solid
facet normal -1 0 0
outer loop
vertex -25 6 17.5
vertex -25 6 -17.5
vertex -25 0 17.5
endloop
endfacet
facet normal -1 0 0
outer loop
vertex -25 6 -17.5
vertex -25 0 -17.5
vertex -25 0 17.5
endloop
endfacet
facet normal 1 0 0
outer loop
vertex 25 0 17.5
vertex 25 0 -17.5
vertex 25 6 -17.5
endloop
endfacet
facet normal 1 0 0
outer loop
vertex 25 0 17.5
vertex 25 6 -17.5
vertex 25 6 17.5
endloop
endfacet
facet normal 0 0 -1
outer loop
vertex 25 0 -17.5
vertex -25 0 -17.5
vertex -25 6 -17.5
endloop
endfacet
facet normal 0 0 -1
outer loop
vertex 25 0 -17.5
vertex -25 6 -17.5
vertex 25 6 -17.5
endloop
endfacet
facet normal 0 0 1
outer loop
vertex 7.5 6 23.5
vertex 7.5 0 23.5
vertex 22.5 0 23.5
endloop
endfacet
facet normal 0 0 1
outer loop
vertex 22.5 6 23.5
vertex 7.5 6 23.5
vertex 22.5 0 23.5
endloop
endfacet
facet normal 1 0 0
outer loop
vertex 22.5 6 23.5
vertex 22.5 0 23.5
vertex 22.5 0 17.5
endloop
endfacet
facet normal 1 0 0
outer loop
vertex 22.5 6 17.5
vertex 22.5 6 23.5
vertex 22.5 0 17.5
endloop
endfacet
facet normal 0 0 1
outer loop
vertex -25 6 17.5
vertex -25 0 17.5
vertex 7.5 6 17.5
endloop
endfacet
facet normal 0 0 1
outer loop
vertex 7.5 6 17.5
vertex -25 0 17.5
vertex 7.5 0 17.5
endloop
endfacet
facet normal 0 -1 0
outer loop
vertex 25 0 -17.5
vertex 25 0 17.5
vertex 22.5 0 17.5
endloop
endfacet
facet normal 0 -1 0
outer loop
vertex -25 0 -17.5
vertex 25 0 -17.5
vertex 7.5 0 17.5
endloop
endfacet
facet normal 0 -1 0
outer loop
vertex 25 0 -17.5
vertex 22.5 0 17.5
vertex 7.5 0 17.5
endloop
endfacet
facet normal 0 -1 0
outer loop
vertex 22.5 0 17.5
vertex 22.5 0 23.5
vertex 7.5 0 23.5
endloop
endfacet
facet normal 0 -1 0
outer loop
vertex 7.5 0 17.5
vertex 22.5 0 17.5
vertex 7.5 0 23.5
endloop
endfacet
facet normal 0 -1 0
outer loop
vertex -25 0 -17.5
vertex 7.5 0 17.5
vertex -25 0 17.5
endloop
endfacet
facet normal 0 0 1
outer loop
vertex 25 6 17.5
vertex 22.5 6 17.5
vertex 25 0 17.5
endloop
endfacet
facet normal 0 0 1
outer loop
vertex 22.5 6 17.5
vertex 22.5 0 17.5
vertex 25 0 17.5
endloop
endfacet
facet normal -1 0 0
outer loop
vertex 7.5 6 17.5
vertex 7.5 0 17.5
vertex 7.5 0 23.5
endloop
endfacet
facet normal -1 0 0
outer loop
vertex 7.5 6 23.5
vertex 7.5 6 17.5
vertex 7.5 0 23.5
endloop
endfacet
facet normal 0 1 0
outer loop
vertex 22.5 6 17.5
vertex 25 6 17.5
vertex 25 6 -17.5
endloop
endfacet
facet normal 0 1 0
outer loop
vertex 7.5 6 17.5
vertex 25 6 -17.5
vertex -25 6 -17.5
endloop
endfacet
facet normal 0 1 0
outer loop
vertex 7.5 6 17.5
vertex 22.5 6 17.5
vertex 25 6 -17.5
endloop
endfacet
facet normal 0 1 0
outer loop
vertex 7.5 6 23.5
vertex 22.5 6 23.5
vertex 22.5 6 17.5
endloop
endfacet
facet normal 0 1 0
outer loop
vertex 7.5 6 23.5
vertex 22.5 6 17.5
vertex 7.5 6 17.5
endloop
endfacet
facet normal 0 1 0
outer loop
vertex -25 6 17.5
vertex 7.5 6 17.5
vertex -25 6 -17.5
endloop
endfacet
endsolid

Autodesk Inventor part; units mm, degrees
ref_plane "YZ Plane" through (0, 0, 0) normal (1, 0, 0) x (0, 1, 0)
ref_plane "XZ Plane" through (0, 0, 0) normal (0, 1, 0) x (-1, 0, 0)
ref_plane "XY Plane" through (0, 0, 0) normal (0, 0, 1) x (1, 0, 0)
sketch "Sketch2" plane through (0, 0, 0) normal (0, 1, 0) x (-1, 0, 0)
  line L0 (25, -17.5) -> (-25, -17.5)
  line L1 (-25, -17.5) -> (-25, 17.5)
  line L2 (25, -17.5) -> (-25, 17.5) construction
  line L3 (-25, -17.5) -> (25, 17.5) construction
  line L4 (-22.5, 17.5) -> (-7.5, 17.5)
  line L5 (-7.5, 17.5) -> (-7.5, 23.5)
  line L6 (-7.5, 23.5) -> (-22.5, 23.5)
  line L7 (-22.5, 23.5) -> (-22.5, 17.5)
  line L8 (25, -17.5) -> (25, 17.5)
  line L9 (25, 17.5) -> (-25, 17.5)
  point P0 (0, 0)
  point P1 (0, 0)
  point P2 (-7.5, 17.5)
  dimension "d0" = 50
  dimension "d1" = 35
  dimension "d58" = 2.5
  dimension "d59" = 15
  dimension "d60" = 6
extrude "Extrusion12" add sketch "Sketch2" along normal blind 6
sketch "Sketch7" plane through (0, 6, 0) normal (0, 1, 0) x (1, 0, 0)
  line L0 (25, -17.5) -> (25, 17.5) projected
  line L1 (-25, -17.5) -> (7.5, -17.5) projected
  point P0 (0, 0)
extrude "Extrusion13" [suppressed]
properties part number "Pared_caja_reduccion_frontal"
